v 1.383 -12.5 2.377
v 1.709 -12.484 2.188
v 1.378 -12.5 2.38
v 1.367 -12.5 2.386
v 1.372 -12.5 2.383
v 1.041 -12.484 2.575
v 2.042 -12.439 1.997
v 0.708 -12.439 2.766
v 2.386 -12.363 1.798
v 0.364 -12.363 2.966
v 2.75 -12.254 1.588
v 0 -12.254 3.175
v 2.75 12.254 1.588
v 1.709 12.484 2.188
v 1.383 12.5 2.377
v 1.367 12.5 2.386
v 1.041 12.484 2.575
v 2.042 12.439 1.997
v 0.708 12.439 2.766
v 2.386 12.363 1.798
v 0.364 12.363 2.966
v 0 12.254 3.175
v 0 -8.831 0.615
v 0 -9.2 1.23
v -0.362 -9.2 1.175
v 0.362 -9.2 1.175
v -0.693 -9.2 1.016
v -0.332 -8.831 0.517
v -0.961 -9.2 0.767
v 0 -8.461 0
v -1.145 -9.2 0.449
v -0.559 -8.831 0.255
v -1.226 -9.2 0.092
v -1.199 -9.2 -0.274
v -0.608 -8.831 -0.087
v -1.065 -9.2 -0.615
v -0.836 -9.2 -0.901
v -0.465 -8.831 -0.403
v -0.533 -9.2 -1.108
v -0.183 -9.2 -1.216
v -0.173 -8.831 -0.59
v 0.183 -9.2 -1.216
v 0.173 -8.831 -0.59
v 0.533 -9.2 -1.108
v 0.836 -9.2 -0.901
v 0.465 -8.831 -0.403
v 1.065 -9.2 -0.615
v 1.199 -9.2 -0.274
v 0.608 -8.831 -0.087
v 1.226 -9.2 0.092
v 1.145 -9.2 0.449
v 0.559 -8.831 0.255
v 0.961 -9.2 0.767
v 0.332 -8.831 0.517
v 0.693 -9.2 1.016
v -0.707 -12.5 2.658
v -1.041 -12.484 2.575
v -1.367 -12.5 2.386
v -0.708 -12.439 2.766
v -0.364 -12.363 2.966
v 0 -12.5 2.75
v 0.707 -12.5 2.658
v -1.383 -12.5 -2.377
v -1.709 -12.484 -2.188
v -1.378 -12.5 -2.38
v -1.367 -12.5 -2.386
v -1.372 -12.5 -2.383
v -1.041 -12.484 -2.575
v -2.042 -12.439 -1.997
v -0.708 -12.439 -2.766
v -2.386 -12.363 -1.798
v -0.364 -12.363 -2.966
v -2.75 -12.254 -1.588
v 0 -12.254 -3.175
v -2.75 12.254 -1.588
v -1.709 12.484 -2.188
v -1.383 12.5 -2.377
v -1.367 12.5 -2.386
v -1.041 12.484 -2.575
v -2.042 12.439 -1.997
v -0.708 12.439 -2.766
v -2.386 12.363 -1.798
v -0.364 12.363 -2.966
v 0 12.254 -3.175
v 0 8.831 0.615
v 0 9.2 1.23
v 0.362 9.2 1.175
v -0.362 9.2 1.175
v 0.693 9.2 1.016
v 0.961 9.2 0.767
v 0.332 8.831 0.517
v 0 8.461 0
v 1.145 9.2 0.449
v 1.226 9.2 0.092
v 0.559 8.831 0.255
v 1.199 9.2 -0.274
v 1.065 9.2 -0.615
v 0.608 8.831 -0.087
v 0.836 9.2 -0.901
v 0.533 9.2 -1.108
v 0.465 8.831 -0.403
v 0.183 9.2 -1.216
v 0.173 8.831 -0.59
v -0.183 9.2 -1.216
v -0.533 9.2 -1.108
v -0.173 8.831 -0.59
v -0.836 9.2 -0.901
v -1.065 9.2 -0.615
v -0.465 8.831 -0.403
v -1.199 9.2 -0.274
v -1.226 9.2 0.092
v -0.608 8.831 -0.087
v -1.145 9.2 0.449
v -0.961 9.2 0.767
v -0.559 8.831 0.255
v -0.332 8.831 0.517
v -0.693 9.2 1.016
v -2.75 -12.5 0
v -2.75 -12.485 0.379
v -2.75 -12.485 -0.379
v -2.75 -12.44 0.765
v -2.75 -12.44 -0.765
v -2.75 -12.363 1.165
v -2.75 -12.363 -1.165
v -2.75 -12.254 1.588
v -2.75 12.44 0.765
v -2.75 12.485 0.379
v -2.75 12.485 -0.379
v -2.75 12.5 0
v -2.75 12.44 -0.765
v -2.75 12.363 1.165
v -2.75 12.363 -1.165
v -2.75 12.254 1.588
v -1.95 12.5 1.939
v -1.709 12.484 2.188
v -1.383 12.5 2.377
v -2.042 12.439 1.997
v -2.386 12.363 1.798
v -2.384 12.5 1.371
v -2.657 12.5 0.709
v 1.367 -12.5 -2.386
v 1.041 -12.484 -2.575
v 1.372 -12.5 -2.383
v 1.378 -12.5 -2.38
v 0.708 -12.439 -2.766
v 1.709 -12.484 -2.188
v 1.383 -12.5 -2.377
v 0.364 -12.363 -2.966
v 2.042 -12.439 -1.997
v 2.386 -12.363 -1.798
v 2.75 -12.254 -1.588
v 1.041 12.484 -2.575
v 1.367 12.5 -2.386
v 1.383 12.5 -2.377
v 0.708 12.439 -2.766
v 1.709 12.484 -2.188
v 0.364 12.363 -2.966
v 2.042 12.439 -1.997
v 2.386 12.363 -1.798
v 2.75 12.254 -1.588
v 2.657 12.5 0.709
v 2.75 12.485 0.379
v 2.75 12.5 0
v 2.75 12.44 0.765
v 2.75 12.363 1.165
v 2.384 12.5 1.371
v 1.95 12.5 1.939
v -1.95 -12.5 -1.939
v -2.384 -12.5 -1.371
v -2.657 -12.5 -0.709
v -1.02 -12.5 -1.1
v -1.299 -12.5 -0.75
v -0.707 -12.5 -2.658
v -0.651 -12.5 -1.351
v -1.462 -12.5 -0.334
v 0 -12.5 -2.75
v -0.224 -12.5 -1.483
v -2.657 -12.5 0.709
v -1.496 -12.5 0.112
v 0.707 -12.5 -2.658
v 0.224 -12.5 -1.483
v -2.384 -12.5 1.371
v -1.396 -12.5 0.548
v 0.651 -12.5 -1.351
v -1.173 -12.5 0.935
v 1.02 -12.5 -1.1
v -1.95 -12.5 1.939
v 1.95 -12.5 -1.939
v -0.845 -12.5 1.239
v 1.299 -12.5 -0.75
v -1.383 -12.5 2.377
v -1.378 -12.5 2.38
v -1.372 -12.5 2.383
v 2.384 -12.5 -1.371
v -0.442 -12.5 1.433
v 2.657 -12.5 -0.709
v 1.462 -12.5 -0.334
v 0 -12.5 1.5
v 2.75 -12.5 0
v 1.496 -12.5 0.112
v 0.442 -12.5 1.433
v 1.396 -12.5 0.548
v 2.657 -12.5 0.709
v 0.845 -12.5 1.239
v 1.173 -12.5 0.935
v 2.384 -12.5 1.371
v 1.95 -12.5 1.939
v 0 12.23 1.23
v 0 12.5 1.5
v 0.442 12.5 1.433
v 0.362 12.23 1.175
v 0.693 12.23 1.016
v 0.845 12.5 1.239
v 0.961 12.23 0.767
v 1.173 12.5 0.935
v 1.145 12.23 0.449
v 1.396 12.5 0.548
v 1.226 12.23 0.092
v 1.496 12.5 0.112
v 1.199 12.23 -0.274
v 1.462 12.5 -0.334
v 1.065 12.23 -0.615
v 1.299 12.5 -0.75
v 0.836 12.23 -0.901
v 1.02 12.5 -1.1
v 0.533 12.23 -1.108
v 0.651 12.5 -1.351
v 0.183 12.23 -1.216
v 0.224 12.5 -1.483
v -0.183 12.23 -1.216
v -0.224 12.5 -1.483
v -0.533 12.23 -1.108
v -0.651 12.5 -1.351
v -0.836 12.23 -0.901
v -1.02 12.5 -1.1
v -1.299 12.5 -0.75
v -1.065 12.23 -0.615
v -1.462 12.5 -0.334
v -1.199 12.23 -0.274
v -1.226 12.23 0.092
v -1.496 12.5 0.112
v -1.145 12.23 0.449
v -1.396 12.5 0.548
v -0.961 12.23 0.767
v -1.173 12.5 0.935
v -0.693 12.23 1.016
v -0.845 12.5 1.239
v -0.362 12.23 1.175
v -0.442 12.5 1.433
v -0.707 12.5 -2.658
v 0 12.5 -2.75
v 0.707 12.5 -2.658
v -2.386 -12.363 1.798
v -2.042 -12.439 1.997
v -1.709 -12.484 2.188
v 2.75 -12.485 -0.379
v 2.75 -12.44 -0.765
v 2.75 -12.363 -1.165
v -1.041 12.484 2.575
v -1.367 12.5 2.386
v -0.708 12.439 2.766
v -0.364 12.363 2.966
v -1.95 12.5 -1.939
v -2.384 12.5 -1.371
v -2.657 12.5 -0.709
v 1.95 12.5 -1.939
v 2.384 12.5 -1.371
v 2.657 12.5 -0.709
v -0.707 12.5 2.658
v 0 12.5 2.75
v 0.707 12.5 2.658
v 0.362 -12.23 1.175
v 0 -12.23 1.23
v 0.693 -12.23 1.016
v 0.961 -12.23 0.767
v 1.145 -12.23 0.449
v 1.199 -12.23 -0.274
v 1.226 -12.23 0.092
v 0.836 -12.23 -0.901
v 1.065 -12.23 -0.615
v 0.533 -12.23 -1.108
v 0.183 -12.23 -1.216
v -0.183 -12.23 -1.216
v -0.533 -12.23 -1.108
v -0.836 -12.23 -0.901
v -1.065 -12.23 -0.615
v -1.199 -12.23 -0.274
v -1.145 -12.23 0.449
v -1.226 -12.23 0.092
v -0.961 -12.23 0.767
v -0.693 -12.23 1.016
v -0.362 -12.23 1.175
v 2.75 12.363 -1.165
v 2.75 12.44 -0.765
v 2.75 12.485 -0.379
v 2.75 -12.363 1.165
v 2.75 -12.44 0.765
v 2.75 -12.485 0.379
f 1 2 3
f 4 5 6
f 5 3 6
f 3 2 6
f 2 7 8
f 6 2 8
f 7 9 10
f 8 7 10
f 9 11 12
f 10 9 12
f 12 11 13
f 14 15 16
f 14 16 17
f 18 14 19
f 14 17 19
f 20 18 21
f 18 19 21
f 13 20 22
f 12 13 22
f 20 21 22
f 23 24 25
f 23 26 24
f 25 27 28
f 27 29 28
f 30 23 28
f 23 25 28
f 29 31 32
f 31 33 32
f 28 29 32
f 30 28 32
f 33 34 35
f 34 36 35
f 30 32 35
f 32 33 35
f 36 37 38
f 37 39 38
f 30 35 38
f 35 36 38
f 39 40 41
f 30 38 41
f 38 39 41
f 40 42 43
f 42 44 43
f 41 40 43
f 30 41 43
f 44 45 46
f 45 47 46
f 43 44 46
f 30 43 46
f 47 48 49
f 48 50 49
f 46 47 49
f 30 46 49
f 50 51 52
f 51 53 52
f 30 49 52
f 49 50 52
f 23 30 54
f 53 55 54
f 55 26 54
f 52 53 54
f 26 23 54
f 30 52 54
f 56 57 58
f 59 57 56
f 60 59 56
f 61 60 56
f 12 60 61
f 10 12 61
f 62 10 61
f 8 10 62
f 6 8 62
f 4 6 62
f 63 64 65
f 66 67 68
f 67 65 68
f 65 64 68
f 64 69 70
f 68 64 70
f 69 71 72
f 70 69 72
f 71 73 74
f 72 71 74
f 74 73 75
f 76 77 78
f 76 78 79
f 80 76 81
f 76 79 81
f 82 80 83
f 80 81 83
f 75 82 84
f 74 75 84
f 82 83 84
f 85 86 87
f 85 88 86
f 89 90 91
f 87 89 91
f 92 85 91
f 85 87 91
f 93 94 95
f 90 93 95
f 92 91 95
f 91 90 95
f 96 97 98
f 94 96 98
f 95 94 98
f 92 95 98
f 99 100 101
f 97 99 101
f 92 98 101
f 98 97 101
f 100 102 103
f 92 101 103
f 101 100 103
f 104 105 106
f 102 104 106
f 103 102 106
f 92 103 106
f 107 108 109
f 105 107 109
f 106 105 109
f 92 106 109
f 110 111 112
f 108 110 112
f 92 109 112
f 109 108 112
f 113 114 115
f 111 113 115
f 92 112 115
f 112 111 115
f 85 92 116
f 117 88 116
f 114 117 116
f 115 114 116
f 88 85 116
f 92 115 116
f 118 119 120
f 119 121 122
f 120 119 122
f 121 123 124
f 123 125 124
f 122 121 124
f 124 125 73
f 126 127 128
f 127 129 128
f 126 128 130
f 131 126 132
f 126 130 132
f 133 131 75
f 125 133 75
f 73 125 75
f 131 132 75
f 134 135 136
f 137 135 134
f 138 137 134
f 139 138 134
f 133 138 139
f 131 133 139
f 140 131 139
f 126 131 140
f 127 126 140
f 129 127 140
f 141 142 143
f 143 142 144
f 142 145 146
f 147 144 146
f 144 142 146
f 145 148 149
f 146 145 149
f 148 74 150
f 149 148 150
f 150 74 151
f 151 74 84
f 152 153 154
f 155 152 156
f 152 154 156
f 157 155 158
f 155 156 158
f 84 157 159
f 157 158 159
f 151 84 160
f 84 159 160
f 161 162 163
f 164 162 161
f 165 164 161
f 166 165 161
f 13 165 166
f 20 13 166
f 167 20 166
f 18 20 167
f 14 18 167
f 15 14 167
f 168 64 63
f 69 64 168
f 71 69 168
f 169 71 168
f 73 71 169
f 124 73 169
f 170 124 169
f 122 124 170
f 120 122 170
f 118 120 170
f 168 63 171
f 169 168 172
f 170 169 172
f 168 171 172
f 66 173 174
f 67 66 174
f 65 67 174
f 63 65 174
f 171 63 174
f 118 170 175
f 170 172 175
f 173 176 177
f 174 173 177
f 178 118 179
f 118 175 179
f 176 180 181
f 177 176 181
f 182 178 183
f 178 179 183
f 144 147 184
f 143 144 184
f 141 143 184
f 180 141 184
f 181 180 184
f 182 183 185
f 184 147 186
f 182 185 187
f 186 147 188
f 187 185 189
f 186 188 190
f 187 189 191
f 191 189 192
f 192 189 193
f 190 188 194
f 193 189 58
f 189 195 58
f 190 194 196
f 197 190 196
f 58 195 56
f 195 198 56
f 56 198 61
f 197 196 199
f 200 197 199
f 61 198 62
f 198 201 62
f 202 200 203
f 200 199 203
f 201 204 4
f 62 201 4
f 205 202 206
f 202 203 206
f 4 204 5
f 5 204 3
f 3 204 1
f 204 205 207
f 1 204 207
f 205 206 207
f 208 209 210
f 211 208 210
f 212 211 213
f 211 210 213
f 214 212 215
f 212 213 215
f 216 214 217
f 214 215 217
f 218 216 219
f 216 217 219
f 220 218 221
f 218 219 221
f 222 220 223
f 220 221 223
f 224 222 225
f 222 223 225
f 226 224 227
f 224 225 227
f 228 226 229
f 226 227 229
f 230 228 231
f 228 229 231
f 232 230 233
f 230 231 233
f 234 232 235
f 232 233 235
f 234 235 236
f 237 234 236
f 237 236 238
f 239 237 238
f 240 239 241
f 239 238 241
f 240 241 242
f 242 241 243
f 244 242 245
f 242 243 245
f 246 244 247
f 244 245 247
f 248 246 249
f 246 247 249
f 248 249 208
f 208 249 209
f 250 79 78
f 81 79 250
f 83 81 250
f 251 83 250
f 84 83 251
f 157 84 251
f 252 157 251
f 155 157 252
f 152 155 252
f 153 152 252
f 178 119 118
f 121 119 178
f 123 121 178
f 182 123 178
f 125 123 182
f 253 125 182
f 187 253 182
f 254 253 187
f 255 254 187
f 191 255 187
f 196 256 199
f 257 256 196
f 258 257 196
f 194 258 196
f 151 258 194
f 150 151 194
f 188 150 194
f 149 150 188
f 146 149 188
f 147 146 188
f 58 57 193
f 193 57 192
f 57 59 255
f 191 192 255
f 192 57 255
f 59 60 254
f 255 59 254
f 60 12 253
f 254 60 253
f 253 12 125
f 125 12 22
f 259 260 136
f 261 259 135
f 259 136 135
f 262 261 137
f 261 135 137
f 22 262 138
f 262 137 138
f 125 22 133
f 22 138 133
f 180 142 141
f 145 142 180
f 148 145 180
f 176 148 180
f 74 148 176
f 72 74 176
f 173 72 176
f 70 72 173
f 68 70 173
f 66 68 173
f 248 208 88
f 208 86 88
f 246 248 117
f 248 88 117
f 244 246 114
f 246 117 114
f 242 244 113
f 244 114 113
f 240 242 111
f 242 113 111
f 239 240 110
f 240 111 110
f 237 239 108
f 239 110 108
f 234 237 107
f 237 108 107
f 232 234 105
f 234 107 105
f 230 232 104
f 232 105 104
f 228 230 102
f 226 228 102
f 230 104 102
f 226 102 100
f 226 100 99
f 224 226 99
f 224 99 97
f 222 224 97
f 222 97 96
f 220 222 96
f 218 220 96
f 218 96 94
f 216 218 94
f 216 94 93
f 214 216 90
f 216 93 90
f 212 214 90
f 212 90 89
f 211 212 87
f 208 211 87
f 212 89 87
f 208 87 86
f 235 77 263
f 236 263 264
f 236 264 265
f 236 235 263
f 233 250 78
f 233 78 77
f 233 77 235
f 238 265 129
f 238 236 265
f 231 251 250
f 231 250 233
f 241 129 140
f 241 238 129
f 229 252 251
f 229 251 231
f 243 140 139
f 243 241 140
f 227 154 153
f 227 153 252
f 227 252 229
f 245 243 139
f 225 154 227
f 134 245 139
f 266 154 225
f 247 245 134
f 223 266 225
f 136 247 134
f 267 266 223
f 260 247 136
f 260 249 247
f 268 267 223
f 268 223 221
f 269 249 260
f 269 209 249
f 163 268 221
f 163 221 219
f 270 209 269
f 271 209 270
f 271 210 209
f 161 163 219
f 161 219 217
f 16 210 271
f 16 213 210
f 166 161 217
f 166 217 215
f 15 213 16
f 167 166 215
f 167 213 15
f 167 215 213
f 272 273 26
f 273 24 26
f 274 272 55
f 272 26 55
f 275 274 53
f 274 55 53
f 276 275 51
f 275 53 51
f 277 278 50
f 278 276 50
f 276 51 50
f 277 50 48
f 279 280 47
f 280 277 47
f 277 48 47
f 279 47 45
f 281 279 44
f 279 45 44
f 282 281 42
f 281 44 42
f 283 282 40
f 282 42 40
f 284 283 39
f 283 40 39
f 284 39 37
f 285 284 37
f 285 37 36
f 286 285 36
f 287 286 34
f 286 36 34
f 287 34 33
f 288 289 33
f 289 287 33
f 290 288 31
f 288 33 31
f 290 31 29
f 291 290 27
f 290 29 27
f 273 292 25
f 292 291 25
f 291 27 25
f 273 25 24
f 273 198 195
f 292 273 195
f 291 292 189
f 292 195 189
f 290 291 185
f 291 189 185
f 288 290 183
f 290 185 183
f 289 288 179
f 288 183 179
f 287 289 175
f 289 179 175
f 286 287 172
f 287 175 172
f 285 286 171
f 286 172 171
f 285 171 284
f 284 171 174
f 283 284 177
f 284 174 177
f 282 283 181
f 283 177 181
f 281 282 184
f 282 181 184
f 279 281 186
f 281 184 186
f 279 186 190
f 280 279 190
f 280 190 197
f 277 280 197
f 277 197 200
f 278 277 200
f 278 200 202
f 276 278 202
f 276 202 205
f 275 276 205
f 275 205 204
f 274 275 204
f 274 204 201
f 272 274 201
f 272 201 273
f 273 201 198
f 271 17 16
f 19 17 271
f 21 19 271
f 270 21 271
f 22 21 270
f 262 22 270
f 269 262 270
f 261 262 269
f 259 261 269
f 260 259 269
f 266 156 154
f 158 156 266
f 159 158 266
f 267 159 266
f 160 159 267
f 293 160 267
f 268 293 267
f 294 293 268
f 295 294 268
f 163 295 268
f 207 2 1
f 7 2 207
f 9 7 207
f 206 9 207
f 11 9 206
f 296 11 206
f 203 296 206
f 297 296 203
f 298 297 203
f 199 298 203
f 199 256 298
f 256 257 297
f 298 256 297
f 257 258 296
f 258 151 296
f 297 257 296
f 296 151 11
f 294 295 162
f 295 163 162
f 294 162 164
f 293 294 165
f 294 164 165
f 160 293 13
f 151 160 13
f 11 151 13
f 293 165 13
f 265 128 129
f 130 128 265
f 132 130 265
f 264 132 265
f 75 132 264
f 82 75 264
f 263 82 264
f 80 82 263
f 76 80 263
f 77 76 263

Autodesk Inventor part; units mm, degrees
ref_plane "YZ Plane" through (0, 0, 0) normal (1, 0, 0) x (0, 1, 0)
ref_plane "XZ Plane" through (0, 0, 0) normal (0, 1, 0) x (-1, 0, 0)
ref_plane "XY Plane" through (0, 0, 0) normal (0, 0, 1) x (1, 0, 0)
sketch "スケッチ1" plane through (0, 0, 0) normal (1, 0, 0) x (0, 1, 0)
  line L0 (-12.5, 0) -> (12.5, 0)
  line L1 (0, 0) -> (0, 3.1754) construction
  line L2 (-12.2544, 3.1754) -> (-12.5, 2.75)
  line L3 (-12.5, 2.75) -> (-12.5, 0)
  line L4 (-12.2544, 3.1754) -> (12.2544, 3.1754)
  line L5 (12.2544, 3.1754) -> (12.5, 2.75)
  line L6 (12.5, 2.75) -> (12.5, 0)
  dimension "d1" = 2.75
  dimension "d2" = 3.1754
  dimension "d3" = 30
  dimension "d4" = 25
revolve "回転1" add sketch "スケッチ1" angle 360 about axis through (0, -12.5, 0) along (0, 1, 0)
sketch "スケッチ2" plane through (0, 12.5, 0) normal (0, 1, 0) x (1, 0, 0)
  line L0 (0, -3.1754) -> (-2.75, -1.5877)
  line L1 (-2.75, -1.5877) -> (-2.75, 1.5877)
  line L2 (-2.75, 1.5877) -> (0, 3.1754)
  line L3 (0, 3.1754) -> (2.75, 1.5877)
  line L4 (2.75, 1.5877) -> (2.75, -1.5877)
  line L5 (2.75, -1.5877) -> (0, -3.1754)
  circle A0 centre (0, 0) radius 3.1754 projected
  point P0 (0, 0)
  point P1 (0, 0)
  point P2 (0, 0)
  point P3 (0, 0)
  point P4 (0, 3.1754)
  point P5 (0, 3.1754)
  point P6 (2.75, -1.5877)
  point P7 (2.75, -1.5877)
extrude "押し出し1" cut sketch "スケッチ2" against normal through all contours A0 L0 | L5 A0 | A0 L1 | L4 A0 | A0 L2 | L3 A0
hole "穴1" at (0, 12.5, 0) direction (0, -1, 0) diameter 2.459 depth 3.3 tip angle 118 countersink diameter 3 countersink angle 90 thread size "M3x0.5" class "6H" standard "ISO Metric profile"
mirror "Mirror1" about plane through (0, 0, 0) normal (0, 1, 0) of "穴1"
equation "\"d2\" = 1.1547 * d1"
properties part number "BSL-325BE" material "Aluminum 2014-T4"
